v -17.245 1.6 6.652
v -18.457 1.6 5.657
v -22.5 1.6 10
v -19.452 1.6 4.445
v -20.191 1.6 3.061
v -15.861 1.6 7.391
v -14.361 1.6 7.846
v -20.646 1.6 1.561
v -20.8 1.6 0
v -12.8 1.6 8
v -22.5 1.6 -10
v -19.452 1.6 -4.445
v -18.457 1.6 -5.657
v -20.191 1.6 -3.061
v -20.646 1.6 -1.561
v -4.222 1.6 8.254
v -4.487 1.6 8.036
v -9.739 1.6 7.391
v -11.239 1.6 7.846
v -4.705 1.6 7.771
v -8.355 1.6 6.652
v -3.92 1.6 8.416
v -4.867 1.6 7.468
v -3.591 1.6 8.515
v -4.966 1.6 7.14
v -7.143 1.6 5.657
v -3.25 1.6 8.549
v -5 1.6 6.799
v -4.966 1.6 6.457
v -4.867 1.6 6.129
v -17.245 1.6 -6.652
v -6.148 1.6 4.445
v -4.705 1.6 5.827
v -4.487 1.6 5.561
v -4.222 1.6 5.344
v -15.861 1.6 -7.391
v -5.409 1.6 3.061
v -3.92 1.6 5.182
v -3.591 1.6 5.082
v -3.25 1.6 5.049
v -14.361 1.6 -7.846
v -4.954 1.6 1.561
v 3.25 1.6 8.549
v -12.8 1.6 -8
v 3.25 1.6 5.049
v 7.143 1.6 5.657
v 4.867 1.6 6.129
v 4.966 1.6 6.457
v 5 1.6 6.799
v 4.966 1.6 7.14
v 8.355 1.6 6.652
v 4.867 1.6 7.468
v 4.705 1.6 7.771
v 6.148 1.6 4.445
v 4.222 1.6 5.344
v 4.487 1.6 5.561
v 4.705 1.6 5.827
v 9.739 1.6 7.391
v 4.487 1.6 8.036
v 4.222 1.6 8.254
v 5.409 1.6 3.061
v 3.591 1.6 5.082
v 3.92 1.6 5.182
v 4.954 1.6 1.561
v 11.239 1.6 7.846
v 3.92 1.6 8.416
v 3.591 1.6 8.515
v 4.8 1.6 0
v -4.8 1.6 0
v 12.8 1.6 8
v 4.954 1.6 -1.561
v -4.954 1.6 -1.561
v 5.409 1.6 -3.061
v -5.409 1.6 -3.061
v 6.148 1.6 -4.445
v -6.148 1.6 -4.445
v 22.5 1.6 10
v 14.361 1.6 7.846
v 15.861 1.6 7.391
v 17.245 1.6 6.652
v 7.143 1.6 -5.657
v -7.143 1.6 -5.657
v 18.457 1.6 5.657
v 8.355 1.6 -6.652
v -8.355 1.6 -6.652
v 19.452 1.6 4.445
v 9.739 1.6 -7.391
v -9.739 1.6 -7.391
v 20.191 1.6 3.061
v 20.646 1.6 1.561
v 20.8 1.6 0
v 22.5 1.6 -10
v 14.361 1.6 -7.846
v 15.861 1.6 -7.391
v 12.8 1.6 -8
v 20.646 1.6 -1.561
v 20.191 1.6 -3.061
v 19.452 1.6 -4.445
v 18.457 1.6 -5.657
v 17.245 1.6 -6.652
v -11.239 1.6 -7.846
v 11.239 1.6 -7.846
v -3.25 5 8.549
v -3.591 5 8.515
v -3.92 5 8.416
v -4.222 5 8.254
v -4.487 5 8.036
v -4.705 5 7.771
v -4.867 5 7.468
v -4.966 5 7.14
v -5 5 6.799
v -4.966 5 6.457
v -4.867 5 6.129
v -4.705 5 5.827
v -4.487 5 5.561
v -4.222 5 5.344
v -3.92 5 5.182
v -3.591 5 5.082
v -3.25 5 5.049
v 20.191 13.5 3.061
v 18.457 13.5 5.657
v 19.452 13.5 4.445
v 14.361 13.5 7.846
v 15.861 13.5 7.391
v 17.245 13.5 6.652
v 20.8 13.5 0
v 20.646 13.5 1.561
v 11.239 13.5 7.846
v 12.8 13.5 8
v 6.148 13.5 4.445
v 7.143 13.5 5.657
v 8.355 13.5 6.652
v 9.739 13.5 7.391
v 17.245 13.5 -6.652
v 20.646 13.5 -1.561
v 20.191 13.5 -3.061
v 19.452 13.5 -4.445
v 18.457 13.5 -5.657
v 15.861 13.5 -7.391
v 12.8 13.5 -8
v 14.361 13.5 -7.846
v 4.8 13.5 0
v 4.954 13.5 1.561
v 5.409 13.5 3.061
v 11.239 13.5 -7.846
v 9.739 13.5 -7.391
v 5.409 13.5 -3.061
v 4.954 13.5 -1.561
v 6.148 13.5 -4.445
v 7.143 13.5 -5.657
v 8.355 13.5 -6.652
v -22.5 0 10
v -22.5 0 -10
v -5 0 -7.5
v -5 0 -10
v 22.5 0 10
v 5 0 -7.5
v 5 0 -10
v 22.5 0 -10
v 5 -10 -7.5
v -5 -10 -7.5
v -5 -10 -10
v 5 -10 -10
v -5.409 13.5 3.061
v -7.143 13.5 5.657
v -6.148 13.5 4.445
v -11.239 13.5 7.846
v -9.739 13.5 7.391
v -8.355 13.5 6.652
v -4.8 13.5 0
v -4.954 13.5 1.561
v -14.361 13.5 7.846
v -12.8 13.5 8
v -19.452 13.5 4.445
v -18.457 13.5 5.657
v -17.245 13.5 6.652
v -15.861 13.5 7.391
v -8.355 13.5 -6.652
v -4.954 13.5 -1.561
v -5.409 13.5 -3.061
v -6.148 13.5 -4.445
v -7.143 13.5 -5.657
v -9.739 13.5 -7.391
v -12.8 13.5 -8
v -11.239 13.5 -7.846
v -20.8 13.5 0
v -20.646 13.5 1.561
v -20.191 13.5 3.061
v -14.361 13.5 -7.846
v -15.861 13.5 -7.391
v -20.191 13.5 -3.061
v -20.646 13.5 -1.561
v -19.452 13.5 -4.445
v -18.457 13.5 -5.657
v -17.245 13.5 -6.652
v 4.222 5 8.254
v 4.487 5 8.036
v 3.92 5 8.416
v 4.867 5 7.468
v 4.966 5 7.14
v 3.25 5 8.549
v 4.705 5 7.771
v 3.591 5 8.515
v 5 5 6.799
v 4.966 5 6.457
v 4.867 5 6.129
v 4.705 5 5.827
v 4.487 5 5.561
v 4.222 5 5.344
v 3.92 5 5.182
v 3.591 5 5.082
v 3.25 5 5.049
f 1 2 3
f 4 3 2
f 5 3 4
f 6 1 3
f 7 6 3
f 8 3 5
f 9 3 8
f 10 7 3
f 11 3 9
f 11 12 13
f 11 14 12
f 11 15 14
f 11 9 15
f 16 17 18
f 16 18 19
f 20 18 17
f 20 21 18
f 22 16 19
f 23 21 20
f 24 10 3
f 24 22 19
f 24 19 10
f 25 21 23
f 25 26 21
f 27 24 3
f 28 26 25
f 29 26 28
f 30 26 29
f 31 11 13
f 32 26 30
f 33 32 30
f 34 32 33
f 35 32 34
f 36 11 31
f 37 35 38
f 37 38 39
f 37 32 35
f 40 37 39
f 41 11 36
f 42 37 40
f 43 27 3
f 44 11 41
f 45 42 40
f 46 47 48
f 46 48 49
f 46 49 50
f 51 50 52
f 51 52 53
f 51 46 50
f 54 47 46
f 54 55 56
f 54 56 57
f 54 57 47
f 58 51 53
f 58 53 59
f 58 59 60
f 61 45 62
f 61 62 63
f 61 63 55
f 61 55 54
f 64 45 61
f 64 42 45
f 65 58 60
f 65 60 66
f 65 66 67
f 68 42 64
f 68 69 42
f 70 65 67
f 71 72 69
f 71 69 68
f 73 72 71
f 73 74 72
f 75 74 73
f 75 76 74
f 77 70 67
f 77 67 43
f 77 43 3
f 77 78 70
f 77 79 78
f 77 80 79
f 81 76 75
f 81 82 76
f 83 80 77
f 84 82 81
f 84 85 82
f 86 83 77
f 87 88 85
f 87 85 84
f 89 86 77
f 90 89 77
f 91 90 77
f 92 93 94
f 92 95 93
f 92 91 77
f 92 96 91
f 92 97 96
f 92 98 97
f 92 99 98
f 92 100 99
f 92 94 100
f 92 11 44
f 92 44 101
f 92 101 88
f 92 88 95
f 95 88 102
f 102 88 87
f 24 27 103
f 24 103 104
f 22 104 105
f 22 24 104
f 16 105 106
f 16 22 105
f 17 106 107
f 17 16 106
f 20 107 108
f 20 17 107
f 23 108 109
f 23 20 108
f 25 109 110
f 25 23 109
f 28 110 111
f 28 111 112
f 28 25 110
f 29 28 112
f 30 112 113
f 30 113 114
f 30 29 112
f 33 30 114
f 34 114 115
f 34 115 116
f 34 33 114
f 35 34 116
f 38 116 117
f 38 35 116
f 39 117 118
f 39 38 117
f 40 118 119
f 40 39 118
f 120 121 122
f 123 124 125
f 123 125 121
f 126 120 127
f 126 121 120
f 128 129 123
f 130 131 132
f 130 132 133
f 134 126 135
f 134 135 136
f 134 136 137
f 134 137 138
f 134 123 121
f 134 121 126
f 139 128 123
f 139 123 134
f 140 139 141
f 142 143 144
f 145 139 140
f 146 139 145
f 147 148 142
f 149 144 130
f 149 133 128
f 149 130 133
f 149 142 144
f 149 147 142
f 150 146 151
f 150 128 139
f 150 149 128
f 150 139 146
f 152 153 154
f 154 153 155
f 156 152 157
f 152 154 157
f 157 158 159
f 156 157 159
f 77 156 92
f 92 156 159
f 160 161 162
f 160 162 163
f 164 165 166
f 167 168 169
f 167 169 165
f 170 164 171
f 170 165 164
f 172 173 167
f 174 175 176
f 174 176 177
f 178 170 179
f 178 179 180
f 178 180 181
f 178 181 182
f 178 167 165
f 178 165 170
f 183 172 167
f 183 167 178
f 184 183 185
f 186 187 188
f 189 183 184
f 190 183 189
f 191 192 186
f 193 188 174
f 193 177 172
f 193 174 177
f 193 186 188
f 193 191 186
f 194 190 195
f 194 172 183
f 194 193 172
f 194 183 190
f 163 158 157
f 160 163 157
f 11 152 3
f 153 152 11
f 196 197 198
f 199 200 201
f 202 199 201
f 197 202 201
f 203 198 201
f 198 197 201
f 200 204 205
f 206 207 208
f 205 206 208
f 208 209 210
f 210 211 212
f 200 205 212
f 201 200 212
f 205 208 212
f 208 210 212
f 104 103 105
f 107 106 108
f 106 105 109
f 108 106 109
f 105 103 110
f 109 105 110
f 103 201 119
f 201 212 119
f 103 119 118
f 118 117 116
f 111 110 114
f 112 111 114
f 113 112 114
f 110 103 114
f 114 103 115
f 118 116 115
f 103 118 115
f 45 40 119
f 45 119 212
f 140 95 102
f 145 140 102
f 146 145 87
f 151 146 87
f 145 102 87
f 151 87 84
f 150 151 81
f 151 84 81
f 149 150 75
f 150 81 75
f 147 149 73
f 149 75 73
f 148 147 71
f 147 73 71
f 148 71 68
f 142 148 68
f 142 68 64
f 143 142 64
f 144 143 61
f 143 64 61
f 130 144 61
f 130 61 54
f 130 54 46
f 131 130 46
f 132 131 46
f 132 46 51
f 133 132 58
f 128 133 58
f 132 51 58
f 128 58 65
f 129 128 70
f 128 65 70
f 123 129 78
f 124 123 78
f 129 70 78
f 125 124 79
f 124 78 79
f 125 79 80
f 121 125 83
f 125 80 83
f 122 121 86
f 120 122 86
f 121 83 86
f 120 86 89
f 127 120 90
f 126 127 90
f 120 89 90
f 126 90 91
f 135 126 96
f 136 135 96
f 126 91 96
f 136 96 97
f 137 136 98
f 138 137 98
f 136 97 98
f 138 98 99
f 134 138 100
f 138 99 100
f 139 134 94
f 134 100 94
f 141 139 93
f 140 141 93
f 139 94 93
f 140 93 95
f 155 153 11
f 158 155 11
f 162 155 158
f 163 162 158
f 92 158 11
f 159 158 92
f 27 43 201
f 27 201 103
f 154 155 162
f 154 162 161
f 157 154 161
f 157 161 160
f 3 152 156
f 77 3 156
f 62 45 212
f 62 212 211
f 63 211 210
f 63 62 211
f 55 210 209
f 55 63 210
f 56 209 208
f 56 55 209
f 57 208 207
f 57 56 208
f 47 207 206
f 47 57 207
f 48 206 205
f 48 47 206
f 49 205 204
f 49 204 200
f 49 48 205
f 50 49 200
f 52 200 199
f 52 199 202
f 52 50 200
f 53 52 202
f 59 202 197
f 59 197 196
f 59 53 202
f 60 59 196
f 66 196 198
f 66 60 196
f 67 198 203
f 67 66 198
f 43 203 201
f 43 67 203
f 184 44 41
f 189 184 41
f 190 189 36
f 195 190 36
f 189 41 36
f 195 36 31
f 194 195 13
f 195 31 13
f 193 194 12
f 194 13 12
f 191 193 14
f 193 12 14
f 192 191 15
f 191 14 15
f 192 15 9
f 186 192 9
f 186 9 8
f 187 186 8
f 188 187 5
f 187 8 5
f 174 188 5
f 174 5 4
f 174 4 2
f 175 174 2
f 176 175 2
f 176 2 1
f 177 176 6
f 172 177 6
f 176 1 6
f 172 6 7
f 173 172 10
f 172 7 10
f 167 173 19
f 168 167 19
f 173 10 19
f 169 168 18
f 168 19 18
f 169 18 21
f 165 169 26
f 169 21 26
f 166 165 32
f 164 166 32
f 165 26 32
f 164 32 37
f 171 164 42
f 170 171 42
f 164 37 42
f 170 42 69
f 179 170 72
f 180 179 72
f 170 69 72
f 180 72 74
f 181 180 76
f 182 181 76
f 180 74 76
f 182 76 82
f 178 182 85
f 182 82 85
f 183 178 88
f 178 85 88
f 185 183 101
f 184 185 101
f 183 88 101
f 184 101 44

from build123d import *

# Parameters (mm, degrees)
SKETCH_1_W      = 45
SKETCH_1_H      = 20
EXTRUDE_1_DEPTH = 1.6
SKETCH_2_R      = 8
EXTRUDE_2_DEPTH = 11.9
EXTRUDE_3_DEPTH = 3.4
SKETCH_4_W      = 10
SKETCH_4_H      = 2.5
EXTRUDE_4_DEPTH = 10


with BuildPart() as part:
    # 草图1 → 凸台-拉伸1 (new body)
    with BuildSketch(Plane(origin=(0, 0, 0), x_dir=(1, 0, 0), z_dir=(0, 1, 0))):
        Rectangle(SKETCH_1_W, SKETCH_1_H)
    extrude(amount=EXTRUDE_1_DEPTH)

    # 草图2 → 凸台-拉伸2 (add)
    with BuildSketch(Plane(origin=(0, 1.6, 0), x_dir=(1, 0, 0), z_dir=(0, 1, 0))):
        with Locations(Location((12.8, 0, 0), (0, 0, 90))):
            Circle(SKETCH_2_R)
        with Locations(Location((-12.8, 0, 0), (0, 0, 90))):
            Circle(SKETCH_2_R)
    extrude(amount=EXTRUDE_2_DEPTH)

    # 草图3 → 凸台-拉伸3 (add)
    with BuildSketch(Plane(origin=(0, 1.6, 0), x_dir=(1, 0, 0), z_dir=(0, 1, 0))):
        with BuildLine():
            Line((-3.25, -5.048754616), (3.25, -5.048754616))
            ThreePointArc((3.25, -5.048754616), (5, -6.798754616), (3.25, -8.548754616))
            Line((3.25, -8.548754616), (-3.25, -8.548754616))
            ThreePointArc((-3.25, -8.548754616), (-5, -6.798754616), (-3.25, -5.048754616))
        make_face()
    extrude(amount=EXTRUDE_3_DEPTH)

    # 草图4 → 凸台-拉伸4 (add)
    with BuildSketch(Plane.XZ):
        with Locations((0, -8.75)):
            Rectangle(SKETCH_4_W, SKETCH_4_H)
    extrude(amount=EXTRUDE_4_DEPTH)


solid = part.part
